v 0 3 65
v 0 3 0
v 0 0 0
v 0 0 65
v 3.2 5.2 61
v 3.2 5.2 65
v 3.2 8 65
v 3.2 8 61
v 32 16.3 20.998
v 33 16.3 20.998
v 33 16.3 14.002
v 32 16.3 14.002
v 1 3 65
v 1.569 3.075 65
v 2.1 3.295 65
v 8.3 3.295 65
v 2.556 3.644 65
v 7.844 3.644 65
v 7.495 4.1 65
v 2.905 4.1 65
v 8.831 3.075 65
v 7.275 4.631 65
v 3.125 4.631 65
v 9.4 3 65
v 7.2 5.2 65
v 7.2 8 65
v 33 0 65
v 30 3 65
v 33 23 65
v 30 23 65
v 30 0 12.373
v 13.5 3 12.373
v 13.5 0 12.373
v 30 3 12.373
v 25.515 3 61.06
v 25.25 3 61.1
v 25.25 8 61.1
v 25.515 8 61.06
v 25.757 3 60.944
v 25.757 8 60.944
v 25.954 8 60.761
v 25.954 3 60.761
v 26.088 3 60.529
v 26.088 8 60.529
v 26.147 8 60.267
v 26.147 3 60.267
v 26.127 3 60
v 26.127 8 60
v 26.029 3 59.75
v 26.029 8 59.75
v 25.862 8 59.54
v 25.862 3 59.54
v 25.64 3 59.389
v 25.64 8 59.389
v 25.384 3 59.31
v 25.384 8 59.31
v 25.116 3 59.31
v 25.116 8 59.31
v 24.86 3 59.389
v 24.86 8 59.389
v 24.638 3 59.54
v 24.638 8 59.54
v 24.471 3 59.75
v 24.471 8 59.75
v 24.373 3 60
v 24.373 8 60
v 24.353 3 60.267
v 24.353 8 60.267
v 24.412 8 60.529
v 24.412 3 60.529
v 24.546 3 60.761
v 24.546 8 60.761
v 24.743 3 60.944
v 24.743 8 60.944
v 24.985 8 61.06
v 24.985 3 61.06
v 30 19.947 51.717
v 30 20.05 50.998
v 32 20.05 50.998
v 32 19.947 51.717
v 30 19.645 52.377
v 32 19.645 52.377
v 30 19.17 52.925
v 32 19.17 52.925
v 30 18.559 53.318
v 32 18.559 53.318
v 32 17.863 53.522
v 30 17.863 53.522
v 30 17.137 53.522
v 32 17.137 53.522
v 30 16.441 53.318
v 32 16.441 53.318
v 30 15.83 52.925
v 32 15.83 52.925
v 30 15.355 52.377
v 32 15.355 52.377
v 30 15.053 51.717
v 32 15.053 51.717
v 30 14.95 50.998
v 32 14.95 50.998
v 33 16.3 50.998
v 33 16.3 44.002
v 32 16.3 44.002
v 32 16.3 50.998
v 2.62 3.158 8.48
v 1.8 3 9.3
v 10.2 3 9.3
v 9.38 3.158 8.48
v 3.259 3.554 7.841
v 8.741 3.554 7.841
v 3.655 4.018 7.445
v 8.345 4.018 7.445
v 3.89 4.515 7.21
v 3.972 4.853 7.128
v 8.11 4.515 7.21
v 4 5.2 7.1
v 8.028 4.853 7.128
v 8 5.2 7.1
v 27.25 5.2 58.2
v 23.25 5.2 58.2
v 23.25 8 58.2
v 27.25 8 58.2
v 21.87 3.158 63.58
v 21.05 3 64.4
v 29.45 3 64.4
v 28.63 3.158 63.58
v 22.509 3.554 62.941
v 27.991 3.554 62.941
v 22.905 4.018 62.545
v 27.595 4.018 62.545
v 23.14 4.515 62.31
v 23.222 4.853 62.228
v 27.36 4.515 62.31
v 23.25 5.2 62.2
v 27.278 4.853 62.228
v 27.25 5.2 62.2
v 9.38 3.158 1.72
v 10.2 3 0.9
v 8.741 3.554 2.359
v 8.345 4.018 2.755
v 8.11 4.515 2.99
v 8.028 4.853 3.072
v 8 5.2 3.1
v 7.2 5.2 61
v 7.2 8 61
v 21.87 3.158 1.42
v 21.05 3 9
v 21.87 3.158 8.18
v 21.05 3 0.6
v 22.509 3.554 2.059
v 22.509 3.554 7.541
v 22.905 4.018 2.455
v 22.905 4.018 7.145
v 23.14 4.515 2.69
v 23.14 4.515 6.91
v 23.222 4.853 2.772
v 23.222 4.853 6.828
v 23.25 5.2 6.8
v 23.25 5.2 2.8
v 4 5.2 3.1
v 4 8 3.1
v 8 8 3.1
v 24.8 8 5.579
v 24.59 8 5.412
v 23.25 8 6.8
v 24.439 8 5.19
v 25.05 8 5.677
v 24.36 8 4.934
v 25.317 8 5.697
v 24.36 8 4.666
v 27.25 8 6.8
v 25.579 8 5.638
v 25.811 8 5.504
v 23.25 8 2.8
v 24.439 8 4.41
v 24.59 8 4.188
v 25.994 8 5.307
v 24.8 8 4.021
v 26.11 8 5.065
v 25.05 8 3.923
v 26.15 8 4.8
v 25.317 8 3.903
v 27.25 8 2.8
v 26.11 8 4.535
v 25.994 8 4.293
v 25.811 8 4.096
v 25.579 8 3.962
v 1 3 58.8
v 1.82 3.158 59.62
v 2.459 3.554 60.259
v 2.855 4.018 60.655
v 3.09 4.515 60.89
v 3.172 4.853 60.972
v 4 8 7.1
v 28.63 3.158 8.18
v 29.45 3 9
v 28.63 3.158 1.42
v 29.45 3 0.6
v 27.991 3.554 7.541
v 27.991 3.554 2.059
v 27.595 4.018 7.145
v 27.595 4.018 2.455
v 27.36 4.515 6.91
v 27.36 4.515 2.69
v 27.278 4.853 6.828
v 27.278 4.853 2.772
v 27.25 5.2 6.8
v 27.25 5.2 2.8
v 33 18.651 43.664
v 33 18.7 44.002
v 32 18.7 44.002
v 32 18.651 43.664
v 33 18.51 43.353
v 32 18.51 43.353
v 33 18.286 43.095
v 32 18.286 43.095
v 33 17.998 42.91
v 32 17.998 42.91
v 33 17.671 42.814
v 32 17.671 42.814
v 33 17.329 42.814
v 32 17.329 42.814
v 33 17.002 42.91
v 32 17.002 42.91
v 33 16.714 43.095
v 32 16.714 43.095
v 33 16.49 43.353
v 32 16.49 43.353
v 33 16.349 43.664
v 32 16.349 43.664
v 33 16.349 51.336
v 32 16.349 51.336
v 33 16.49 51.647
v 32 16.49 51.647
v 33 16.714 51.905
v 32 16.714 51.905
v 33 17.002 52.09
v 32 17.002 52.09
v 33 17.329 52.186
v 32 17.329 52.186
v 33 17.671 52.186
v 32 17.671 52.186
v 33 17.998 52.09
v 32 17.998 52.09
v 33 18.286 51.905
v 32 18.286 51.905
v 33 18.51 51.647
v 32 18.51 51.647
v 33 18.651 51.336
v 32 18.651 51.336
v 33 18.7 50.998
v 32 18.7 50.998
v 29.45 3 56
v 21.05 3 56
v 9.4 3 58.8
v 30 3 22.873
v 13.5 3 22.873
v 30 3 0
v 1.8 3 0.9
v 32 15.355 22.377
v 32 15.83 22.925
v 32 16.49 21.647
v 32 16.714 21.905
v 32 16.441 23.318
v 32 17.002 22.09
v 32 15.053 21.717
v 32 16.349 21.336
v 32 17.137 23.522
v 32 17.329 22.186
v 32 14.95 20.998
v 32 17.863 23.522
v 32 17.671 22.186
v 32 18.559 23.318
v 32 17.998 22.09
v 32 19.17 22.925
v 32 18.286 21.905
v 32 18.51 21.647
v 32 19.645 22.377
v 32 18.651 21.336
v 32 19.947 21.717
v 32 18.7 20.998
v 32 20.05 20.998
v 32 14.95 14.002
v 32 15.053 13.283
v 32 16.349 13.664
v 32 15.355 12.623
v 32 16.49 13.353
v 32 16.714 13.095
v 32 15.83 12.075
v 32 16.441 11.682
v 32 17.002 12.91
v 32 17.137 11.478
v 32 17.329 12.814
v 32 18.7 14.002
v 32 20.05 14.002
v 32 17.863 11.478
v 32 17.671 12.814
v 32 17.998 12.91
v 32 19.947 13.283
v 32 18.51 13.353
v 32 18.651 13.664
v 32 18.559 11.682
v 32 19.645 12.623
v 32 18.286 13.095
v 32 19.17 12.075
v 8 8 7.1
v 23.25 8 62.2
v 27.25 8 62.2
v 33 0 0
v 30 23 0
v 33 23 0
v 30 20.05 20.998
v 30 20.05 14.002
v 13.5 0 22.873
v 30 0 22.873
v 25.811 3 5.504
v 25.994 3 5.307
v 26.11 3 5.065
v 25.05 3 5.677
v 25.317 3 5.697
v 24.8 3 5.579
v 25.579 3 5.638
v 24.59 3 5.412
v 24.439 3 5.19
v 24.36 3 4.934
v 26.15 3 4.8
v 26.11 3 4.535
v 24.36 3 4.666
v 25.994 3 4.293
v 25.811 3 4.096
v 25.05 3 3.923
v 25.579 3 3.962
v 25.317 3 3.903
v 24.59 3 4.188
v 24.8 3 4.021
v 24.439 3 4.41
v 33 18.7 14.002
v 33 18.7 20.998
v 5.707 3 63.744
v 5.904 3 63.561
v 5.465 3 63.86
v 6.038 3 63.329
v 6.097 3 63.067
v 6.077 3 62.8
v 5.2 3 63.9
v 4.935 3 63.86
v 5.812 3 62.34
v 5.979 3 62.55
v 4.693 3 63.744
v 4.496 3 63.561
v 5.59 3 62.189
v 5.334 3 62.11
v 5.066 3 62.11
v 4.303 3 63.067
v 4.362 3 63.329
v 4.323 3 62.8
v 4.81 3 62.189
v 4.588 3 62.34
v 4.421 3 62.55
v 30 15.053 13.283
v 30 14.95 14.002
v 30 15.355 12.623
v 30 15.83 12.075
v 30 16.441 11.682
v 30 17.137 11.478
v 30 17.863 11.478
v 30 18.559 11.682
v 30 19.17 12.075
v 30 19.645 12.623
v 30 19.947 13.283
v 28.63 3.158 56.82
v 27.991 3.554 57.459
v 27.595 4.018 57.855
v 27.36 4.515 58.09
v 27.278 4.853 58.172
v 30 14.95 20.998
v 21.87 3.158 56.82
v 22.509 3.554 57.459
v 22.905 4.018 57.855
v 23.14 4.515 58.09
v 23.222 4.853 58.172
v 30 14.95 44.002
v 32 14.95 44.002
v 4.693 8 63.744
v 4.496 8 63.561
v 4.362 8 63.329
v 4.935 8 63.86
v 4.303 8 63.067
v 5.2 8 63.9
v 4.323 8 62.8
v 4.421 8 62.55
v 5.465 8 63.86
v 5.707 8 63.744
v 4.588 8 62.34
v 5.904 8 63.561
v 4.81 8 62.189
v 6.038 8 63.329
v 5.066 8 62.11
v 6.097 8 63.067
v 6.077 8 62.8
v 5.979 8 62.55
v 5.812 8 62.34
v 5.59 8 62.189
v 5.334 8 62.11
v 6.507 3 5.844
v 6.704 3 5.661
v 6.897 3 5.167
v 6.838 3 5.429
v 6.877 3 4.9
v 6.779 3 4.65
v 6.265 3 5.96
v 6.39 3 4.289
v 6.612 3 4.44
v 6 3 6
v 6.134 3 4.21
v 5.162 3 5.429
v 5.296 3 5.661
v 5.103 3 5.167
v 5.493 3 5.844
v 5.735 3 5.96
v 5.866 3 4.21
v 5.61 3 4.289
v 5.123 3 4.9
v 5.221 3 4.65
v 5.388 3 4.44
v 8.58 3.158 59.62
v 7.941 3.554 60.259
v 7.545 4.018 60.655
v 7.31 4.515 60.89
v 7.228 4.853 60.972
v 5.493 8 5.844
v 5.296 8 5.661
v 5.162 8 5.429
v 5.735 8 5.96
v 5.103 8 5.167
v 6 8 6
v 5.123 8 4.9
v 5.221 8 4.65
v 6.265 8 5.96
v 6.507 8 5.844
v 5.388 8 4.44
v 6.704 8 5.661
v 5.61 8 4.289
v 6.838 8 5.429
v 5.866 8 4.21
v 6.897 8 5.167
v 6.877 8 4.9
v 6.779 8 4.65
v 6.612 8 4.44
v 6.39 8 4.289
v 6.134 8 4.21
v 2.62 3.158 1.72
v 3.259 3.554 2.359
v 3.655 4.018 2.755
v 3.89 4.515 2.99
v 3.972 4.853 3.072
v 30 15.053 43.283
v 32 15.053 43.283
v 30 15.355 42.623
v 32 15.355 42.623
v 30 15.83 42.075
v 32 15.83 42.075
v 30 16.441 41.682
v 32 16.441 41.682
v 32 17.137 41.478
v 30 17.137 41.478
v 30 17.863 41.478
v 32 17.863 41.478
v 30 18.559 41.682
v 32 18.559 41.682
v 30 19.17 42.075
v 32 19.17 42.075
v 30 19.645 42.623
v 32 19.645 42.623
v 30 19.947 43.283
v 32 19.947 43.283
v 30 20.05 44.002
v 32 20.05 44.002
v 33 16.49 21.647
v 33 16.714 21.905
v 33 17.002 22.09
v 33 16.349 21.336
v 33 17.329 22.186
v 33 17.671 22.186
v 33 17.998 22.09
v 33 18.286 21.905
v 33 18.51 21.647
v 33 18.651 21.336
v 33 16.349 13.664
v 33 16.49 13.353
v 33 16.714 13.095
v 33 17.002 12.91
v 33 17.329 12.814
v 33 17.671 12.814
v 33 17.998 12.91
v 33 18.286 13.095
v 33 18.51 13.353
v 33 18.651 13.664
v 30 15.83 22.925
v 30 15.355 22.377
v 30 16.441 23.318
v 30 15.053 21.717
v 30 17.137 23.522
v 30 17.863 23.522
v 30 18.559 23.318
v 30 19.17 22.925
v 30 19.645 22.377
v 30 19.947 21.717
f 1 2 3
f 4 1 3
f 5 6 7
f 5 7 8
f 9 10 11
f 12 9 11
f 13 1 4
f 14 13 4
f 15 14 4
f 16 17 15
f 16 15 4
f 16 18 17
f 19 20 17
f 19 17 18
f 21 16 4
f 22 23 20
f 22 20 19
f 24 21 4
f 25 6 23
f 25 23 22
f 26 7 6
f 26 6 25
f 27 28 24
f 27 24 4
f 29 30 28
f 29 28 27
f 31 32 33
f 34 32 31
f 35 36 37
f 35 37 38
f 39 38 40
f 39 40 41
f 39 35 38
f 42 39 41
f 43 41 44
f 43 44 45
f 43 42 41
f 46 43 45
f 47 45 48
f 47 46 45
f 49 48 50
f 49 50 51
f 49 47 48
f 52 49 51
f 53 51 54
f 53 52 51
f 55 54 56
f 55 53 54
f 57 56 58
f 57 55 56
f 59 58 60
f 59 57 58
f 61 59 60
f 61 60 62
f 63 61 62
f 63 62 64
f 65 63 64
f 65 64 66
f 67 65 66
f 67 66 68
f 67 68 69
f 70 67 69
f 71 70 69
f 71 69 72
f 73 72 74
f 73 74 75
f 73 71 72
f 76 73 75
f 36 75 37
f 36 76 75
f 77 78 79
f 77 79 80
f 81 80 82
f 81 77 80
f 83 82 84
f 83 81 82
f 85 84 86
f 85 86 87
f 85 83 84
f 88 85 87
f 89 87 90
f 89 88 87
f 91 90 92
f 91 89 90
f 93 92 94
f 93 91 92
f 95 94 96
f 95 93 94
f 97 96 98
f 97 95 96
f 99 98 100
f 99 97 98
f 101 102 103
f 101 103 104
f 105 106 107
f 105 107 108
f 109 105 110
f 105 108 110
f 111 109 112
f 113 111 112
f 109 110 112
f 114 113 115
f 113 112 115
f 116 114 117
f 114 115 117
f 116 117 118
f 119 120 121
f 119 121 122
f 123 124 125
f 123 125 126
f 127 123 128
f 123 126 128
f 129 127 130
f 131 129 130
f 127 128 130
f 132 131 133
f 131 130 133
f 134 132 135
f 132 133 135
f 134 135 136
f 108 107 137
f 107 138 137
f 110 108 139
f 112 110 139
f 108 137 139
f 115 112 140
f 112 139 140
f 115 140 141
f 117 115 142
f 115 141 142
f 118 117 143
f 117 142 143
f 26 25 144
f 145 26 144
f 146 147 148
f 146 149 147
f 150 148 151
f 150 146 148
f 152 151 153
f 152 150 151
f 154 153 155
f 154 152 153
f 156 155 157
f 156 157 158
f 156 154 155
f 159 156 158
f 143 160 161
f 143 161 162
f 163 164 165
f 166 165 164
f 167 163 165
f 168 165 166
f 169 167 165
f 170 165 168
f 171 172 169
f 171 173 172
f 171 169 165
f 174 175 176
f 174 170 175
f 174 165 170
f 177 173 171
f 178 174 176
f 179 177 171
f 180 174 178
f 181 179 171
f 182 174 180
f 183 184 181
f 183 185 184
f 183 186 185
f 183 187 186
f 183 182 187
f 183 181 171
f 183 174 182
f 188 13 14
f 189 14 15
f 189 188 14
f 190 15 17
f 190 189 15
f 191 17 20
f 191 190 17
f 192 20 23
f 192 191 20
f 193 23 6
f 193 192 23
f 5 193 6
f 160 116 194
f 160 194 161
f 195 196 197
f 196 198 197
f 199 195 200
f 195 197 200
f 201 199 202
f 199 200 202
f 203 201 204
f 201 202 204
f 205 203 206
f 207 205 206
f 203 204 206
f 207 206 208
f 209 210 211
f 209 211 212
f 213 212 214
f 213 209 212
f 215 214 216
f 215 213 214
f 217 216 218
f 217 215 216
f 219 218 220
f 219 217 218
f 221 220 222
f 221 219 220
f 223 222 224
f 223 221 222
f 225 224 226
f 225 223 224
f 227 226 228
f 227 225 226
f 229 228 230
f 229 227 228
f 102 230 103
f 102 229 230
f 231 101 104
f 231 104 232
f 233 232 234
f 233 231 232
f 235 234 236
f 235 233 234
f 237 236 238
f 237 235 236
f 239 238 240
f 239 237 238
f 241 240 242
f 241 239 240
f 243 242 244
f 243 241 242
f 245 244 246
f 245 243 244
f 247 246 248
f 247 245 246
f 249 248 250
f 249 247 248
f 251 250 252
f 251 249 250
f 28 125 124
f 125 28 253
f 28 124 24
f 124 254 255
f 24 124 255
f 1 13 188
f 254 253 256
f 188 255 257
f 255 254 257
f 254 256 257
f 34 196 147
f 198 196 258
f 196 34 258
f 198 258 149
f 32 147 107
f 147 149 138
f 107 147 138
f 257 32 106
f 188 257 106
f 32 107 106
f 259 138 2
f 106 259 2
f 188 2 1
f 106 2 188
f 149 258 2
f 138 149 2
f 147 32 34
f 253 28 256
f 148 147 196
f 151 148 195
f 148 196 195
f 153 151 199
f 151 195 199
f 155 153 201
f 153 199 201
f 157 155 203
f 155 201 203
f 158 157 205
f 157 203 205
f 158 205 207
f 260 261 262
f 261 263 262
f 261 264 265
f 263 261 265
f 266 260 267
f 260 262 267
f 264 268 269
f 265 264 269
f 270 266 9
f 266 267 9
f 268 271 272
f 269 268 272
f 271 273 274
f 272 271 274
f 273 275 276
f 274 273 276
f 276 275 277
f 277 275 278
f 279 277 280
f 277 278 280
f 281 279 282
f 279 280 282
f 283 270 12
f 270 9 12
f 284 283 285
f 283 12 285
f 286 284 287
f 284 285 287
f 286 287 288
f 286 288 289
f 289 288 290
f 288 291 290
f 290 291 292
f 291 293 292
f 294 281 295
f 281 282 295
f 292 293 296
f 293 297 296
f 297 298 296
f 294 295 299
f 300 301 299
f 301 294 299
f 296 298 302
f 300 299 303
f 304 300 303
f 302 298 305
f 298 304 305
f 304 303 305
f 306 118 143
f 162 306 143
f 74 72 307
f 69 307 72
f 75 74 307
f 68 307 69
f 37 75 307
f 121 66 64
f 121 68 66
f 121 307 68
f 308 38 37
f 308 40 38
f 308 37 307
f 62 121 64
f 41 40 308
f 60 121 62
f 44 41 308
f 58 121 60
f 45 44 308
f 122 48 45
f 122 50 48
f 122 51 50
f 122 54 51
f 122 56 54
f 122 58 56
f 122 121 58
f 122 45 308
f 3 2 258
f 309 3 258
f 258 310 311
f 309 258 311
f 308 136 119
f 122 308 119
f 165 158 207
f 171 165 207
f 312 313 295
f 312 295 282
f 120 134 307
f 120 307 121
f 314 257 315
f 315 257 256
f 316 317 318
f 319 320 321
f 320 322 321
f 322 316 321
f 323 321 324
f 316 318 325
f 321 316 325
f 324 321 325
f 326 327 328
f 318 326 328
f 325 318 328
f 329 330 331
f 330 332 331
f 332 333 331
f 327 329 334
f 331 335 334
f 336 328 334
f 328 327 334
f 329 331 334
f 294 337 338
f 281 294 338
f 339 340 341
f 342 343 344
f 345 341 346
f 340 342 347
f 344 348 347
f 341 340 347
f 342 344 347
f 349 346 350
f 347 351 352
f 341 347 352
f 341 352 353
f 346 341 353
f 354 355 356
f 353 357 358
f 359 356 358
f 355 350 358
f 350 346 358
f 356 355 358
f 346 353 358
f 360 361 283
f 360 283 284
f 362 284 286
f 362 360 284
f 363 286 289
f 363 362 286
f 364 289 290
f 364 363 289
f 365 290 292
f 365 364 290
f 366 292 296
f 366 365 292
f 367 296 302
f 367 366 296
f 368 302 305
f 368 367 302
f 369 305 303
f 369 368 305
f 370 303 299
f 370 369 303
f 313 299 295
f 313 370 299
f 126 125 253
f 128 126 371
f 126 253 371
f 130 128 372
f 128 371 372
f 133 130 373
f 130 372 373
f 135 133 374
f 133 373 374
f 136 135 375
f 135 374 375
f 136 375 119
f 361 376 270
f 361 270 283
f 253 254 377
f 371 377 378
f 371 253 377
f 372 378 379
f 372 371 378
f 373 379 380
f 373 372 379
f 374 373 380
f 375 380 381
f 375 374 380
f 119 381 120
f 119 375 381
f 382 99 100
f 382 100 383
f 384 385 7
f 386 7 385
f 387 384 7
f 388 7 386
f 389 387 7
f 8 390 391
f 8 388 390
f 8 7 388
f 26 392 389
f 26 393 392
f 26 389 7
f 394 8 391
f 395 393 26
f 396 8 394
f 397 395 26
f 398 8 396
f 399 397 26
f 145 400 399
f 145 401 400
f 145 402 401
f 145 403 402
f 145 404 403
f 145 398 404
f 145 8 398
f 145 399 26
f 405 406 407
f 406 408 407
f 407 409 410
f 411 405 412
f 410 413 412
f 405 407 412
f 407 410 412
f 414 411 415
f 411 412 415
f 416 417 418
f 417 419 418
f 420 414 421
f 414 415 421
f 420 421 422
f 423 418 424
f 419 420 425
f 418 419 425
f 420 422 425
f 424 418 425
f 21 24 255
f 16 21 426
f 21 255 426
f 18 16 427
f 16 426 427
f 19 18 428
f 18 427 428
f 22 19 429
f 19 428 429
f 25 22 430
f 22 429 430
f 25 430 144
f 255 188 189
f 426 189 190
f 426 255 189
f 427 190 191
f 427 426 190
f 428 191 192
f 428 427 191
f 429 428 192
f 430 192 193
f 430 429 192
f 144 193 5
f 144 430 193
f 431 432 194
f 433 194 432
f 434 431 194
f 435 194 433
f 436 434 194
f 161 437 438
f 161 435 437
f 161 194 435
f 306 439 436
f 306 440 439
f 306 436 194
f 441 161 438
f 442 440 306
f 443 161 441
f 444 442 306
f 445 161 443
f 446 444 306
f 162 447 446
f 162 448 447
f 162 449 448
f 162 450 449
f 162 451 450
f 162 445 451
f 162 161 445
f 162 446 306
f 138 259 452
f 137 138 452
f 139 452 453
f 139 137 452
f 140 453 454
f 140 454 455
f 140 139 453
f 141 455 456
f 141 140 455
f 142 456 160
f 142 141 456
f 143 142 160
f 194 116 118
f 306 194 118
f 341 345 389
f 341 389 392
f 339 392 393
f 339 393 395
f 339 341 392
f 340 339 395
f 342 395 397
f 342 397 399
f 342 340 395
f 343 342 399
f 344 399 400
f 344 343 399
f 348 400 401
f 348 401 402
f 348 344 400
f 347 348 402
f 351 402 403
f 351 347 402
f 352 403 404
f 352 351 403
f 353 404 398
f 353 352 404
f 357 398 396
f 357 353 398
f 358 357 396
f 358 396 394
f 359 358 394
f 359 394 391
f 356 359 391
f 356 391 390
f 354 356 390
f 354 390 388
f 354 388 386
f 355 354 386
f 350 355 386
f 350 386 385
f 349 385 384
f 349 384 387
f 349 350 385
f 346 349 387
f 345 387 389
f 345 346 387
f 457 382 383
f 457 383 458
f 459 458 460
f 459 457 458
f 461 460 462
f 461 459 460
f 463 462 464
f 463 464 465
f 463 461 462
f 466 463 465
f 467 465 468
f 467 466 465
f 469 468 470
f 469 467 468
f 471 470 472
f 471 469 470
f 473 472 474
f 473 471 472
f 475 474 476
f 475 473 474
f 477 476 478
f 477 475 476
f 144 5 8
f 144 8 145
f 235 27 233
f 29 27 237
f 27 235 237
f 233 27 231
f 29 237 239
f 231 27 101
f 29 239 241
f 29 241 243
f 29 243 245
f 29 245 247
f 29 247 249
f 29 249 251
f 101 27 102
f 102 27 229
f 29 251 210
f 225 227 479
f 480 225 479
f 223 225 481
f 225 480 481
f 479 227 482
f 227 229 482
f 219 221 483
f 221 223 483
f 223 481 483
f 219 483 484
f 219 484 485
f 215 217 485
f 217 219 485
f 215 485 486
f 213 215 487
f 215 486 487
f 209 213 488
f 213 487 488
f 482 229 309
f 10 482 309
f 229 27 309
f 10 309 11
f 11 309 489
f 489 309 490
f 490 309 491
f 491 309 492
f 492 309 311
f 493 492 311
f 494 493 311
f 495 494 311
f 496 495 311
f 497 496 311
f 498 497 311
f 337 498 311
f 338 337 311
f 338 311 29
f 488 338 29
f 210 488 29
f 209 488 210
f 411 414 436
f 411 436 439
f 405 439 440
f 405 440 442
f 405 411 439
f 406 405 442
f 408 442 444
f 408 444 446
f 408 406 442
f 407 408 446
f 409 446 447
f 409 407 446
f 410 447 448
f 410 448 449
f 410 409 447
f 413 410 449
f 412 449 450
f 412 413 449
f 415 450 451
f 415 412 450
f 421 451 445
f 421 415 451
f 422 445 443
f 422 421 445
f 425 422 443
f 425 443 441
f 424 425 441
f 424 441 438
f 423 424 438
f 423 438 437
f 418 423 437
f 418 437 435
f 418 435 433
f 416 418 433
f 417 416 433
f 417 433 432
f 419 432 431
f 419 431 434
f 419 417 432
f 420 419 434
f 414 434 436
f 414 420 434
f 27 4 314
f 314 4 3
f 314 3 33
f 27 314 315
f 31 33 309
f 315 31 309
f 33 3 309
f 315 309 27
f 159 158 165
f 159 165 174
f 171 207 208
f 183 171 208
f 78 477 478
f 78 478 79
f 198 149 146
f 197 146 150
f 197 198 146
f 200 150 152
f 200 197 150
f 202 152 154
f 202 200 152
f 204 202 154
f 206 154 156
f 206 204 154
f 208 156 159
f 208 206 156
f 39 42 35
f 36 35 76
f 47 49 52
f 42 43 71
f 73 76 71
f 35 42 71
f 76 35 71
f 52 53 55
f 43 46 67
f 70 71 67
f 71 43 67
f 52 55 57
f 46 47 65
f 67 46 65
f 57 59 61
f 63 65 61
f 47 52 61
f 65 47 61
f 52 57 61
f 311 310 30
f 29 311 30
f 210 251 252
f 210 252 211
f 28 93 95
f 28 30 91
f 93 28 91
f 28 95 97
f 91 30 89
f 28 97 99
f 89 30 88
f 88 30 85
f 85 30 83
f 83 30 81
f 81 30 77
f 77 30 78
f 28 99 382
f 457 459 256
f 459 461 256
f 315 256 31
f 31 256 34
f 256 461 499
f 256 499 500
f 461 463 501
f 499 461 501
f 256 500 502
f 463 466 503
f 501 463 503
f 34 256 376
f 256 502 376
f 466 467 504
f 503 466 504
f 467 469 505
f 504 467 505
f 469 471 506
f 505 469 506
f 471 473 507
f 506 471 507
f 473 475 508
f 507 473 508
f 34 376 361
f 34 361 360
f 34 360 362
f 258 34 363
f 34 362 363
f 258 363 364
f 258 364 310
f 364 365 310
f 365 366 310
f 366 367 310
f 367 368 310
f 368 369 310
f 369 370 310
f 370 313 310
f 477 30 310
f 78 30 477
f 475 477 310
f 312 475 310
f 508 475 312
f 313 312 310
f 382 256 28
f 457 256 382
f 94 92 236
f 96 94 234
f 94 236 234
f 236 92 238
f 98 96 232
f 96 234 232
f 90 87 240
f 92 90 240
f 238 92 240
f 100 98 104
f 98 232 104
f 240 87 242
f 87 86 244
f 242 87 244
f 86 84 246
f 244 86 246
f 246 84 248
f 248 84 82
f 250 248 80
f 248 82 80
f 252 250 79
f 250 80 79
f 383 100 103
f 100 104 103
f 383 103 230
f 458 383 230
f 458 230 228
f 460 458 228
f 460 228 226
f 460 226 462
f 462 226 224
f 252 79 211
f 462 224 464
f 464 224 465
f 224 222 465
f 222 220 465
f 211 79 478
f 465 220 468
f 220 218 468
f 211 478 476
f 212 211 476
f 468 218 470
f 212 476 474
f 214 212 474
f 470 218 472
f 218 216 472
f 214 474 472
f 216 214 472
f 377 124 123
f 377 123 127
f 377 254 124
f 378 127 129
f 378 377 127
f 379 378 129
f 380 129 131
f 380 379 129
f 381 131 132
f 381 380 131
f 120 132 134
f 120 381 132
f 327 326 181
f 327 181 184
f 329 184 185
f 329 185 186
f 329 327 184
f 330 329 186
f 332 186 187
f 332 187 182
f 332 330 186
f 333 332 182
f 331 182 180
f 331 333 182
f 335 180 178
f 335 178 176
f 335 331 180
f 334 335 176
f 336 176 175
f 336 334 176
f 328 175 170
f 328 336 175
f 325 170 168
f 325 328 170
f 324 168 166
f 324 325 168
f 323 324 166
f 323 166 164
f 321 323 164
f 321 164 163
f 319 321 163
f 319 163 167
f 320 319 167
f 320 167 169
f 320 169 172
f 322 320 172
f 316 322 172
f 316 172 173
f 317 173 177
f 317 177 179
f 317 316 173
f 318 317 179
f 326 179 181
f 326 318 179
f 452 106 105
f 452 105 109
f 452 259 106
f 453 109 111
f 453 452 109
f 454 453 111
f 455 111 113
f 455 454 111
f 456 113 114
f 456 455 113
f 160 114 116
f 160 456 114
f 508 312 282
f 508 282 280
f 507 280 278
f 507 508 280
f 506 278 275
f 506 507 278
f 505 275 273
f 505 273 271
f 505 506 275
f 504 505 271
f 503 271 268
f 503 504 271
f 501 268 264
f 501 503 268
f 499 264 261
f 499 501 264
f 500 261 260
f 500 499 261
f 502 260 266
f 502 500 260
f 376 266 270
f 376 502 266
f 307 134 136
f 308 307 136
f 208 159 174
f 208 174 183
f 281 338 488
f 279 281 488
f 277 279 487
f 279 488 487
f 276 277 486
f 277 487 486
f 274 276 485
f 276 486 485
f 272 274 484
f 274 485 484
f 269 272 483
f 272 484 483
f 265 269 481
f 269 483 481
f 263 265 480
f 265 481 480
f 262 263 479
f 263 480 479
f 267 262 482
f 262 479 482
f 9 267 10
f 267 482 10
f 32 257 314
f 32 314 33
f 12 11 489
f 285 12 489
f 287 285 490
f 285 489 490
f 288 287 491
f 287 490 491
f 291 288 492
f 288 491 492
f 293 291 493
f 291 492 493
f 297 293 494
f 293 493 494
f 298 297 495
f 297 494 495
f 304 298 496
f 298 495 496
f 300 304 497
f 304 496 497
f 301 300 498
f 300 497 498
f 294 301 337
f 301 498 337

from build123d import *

# Parameters (mm, degrees)
BOSS_EXTRUDE1_DEPTH = 65
SKETCH2_W           = 4
SKETCH2_H           = 4
SKETCH2_R           = 0.9
BOSS_EXTRUDE2_DEPTH = 5
CUT_EXTRUDE2_REACH  = 81.612
SKETCH3_W           = 16.5
SKETCH3_H           = 10.5
CUT_EXTRUDE3_REACH  = 82.864
CUT_EXTRUDE4_DEPTH  = 2
FILLET1_R           = 2.2
CUT_EXTRUDE5_REACH  = 81.687
SKETCH7_W           = 65
SKETCH7_H           = 12


with BuildPart() as part:
    # Sketch1 → Boss-Extrude1 (new body)
    with BuildSketch(Plane.XY):
        Polygon((0, 0), (33, 0), (33, 35), (30, 35), (30, 3), (0, 3), align=None)
    extrude(amount=BOSS_EXTRUDE1_DEPTH)

    # Sketch2 → Boss-Extrude2 (add)
    # profile 1 of 4: a face of its own
    with BuildSketch(Plane(origin=(0, 3, 0), x_dir=(1, 0, 0), z_dir=(0, 1, 0))):
        with Locations((25.25, -60.2)):
            Rectangle(SKETCH2_W, SKETCH2_H)
        with Locations(Location((25.25, -60.2, 0), (0, 0, 270))):
            Circle(SKETCH2_R, mode=Mode.SUBTRACT)
    # profile 2 of 4: a face of its own
    with BuildSketch(Plane(origin=(0, 3, 0), x_dir=(1, 0, 0), z_dir=(0, 1, 0))):
        with Locations((25.25, -4.8)):
            Rectangle(SKETCH2_W, SKETCH2_H)
        with Locations((25.25, -4.8)):
            Circle(SKETCH2_R, mode=Mode.SUBTRACT)
    # profile 3 of 4: a face of its own
    with BuildSketch(Plane(origin=(0, 3, 0), x_dir=(1, 0, 0), z_dir=(0, 1, 0))):
        with Locations((6, -5.1)):
            Rectangle(SKETCH2_W, SKETCH2_H)
        with Locations(Location((6, -5.1, 0), (0, 0, 270))):
            Circle(SKETCH2_R, mode=Mode.SUBTRACT)
    # profile 4 of 4: a face of its own
    with BuildSketch(Plane(origin=(0, 3, 0), x_dir=(1, 0, 0), z_dir=(0, 1, 0))):
        with Locations((5.2, -63)):
            Rectangle(SKETCH2_W, SKETCH2_H)
        with Locations(Location((5.2, -63, 0), (0, 0, 270))):
            Circle(SKETCH2_R, mode=Mode.SUBTRACT)
    extrude(amount=BOSS_EXTRUDE2_DEPTH)

    # Sketch3 → Cut-Extrude2 (cut, up to next)
    with BuildSketch(Plane(origin=(0, 3, 0), x_dir=(1, 0, 0), z_dir=(0, 1, 0)), mode=Mode.PRIVATE) as cut_extrude2_sk1:
        with Locations((21.75, -17.622736475)):
            Rectangle(SKETCH3_W, SKETCH3_H)
    cut_extrude2_tool1 = extrude(cut_extrude2_sk1.sketch, amount=-CUT_EXTRUDE2_REACH, mode=Mode.PRIVATE) & part.part
    add(cut_extrude2_tool1.solids().sort_by_distance((21.75, 3, 17.622736))[0], mode=Mode.SUBTRACT)

    # Sketch4 → Cut-Extrude3 (cut, up to next)
    with BuildSketch(Plane(origin=(33, 0, 0), x_dir=(0, 0, -1), z_dir=(1, 0, 0)), mode=Mode.PRIVATE) as cut_extrude3_sk1:
        with BuildLine():
            Line((-44.00188963, 16.3), (-50.99811037, 16.3))
            ThreePointArc((-50.99811037, 16.3), (-52.19811037, 17.5), (-50.99811037, 18.7))
            Line((-50.99811037, 18.7), (-44.00188963, 18.7))
            ThreePointArc((-44.00188963, 18.7), (-42.80188963, 17.5), (-44.00188963, 16.3))
        make_face()
    cut_extrude3_tool1 = extrude(cut_extrude3_sk1.sketch, amount=-CUT_EXTRUDE3_REACH, mode=Mode.PRIVATE) & part.part
    # Sketch4 → Cut-Extrude3 (cut, up to next)
    with BuildSketch(Plane(origin=(33, 0, 0), x_dir=(0, 0, -1), z_dir=(1, 0, 0)), mode=Mode.PRIVATE) as cut_extrude3_sk2:
        with BuildLine():
            Line((-20.99811037, 16.3), (-14.00188963, 16.3))
            ThreePointArc((-14.00188963, 16.3), (-12.80188963, 17.5), (-14.00188963, 18.7))
            Line((-14.00188963, 18.7), (-20.99811037, 18.7))
            ThreePointArc((-20.99811037, 18.7), (-22.19811037, 17.5), (-20.99811037, 16.3))
        make_face()
    cut_extrude3_tool2 = extrude(cut_extrude3_sk2.sketch, amount=-CUT_EXTRUDE3_REACH, mode=Mode.PRIVATE) & part.part
    add(cut_extrude3_tool1.solids().sort_by_distance((33, 17.5, 47.5))[0], mode=Mode.SUBTRACT)
    add(cut_extrude3_tool2.solids().sort_by_distance((33, 17.5, 17.5))[0], mode=Mode.SUBTRACT)

    # Sketch5 → Cut-Extrude4 (cut)
    with BuildSketch(Plane.ZY.offset(-30)):
        with BuildLine():
            Line((20.99811037, 14.95), (14.00188963, 14.95))
            ThreePointArc((14.00188963, 14.95), (11.45188963, 17.5), (14.00188963, 20.05))
            Line((14.00188963, 20.05), (20.99811037, 20.05))
            ThreePointArc((20.99811037, 20.05), (23.54811037, 17.5), (20.99811037, 14.95))
        make_face()
        with BuildLine():
            Line((44.00188963, 20.05), (50.99811037, 20.05))
            ThreePointArc((50.99811037, 20.05), (53.54811037, 17.5), (50.99811037, 14.95))
            Line((50.99811037, 14.95), (44.00188963, 14.95))
            ThreePointArc((44.00188963, 14.95), (41.45188963, 17.5), (44.00188963, 20.05))
        make_face()
    extrude(amount=-CUT_EXTRUDE4_DEPTH, mode=Mode.SUBTRACT)

    # Fillet1
    fillet1_edges = [part.edges().sort_by_distance(p)[0] for p in [
        (25.25, 3, 58.2),
        (27.25, 3, 60.2),
        (25.25, 3, 62.2),
        (23.25, 3, 60.2),
        (25.25, 3, 2.8),
        (23.25, 3, 4.8),
        (27.25, 3, 4.8),
        (25.25, 3, 6.8),
        (7.2, 3, 63),
        (5.2, 3, 61),
        (3.2, 3, 63),
        (8, 3, 5.1),
        (6, 3, 3.1),
        (6, 3, 7.1),
        (4, 3, 5.1),
    ]]
    fillet(fillet1_edges, radius=FILLET1_R)

    # Sketch7 → Cut-Extrude5 (cut, up to next)
    with BuildSketch(Plane.ZY.offset(-30), mode=Mode.PRIVATE) as cut_extrude5_sk1:
        with Locations((32.5, 29)):
            Rectangle(SKETCH7_W, SKETCH7_H)
    cut_extrude5_tool1 = extrude(cut_extrude5_sk1.sketch, amount=-CUT_EXTRUDE5_REACH, mode=Mode.PRIVATE) & part.part
    add(cut_extrude5_tool1.solids().sort_by_distance((30, 29, 32.5))[0], mode=Mode.SUBTRACT)


solid = part.part
